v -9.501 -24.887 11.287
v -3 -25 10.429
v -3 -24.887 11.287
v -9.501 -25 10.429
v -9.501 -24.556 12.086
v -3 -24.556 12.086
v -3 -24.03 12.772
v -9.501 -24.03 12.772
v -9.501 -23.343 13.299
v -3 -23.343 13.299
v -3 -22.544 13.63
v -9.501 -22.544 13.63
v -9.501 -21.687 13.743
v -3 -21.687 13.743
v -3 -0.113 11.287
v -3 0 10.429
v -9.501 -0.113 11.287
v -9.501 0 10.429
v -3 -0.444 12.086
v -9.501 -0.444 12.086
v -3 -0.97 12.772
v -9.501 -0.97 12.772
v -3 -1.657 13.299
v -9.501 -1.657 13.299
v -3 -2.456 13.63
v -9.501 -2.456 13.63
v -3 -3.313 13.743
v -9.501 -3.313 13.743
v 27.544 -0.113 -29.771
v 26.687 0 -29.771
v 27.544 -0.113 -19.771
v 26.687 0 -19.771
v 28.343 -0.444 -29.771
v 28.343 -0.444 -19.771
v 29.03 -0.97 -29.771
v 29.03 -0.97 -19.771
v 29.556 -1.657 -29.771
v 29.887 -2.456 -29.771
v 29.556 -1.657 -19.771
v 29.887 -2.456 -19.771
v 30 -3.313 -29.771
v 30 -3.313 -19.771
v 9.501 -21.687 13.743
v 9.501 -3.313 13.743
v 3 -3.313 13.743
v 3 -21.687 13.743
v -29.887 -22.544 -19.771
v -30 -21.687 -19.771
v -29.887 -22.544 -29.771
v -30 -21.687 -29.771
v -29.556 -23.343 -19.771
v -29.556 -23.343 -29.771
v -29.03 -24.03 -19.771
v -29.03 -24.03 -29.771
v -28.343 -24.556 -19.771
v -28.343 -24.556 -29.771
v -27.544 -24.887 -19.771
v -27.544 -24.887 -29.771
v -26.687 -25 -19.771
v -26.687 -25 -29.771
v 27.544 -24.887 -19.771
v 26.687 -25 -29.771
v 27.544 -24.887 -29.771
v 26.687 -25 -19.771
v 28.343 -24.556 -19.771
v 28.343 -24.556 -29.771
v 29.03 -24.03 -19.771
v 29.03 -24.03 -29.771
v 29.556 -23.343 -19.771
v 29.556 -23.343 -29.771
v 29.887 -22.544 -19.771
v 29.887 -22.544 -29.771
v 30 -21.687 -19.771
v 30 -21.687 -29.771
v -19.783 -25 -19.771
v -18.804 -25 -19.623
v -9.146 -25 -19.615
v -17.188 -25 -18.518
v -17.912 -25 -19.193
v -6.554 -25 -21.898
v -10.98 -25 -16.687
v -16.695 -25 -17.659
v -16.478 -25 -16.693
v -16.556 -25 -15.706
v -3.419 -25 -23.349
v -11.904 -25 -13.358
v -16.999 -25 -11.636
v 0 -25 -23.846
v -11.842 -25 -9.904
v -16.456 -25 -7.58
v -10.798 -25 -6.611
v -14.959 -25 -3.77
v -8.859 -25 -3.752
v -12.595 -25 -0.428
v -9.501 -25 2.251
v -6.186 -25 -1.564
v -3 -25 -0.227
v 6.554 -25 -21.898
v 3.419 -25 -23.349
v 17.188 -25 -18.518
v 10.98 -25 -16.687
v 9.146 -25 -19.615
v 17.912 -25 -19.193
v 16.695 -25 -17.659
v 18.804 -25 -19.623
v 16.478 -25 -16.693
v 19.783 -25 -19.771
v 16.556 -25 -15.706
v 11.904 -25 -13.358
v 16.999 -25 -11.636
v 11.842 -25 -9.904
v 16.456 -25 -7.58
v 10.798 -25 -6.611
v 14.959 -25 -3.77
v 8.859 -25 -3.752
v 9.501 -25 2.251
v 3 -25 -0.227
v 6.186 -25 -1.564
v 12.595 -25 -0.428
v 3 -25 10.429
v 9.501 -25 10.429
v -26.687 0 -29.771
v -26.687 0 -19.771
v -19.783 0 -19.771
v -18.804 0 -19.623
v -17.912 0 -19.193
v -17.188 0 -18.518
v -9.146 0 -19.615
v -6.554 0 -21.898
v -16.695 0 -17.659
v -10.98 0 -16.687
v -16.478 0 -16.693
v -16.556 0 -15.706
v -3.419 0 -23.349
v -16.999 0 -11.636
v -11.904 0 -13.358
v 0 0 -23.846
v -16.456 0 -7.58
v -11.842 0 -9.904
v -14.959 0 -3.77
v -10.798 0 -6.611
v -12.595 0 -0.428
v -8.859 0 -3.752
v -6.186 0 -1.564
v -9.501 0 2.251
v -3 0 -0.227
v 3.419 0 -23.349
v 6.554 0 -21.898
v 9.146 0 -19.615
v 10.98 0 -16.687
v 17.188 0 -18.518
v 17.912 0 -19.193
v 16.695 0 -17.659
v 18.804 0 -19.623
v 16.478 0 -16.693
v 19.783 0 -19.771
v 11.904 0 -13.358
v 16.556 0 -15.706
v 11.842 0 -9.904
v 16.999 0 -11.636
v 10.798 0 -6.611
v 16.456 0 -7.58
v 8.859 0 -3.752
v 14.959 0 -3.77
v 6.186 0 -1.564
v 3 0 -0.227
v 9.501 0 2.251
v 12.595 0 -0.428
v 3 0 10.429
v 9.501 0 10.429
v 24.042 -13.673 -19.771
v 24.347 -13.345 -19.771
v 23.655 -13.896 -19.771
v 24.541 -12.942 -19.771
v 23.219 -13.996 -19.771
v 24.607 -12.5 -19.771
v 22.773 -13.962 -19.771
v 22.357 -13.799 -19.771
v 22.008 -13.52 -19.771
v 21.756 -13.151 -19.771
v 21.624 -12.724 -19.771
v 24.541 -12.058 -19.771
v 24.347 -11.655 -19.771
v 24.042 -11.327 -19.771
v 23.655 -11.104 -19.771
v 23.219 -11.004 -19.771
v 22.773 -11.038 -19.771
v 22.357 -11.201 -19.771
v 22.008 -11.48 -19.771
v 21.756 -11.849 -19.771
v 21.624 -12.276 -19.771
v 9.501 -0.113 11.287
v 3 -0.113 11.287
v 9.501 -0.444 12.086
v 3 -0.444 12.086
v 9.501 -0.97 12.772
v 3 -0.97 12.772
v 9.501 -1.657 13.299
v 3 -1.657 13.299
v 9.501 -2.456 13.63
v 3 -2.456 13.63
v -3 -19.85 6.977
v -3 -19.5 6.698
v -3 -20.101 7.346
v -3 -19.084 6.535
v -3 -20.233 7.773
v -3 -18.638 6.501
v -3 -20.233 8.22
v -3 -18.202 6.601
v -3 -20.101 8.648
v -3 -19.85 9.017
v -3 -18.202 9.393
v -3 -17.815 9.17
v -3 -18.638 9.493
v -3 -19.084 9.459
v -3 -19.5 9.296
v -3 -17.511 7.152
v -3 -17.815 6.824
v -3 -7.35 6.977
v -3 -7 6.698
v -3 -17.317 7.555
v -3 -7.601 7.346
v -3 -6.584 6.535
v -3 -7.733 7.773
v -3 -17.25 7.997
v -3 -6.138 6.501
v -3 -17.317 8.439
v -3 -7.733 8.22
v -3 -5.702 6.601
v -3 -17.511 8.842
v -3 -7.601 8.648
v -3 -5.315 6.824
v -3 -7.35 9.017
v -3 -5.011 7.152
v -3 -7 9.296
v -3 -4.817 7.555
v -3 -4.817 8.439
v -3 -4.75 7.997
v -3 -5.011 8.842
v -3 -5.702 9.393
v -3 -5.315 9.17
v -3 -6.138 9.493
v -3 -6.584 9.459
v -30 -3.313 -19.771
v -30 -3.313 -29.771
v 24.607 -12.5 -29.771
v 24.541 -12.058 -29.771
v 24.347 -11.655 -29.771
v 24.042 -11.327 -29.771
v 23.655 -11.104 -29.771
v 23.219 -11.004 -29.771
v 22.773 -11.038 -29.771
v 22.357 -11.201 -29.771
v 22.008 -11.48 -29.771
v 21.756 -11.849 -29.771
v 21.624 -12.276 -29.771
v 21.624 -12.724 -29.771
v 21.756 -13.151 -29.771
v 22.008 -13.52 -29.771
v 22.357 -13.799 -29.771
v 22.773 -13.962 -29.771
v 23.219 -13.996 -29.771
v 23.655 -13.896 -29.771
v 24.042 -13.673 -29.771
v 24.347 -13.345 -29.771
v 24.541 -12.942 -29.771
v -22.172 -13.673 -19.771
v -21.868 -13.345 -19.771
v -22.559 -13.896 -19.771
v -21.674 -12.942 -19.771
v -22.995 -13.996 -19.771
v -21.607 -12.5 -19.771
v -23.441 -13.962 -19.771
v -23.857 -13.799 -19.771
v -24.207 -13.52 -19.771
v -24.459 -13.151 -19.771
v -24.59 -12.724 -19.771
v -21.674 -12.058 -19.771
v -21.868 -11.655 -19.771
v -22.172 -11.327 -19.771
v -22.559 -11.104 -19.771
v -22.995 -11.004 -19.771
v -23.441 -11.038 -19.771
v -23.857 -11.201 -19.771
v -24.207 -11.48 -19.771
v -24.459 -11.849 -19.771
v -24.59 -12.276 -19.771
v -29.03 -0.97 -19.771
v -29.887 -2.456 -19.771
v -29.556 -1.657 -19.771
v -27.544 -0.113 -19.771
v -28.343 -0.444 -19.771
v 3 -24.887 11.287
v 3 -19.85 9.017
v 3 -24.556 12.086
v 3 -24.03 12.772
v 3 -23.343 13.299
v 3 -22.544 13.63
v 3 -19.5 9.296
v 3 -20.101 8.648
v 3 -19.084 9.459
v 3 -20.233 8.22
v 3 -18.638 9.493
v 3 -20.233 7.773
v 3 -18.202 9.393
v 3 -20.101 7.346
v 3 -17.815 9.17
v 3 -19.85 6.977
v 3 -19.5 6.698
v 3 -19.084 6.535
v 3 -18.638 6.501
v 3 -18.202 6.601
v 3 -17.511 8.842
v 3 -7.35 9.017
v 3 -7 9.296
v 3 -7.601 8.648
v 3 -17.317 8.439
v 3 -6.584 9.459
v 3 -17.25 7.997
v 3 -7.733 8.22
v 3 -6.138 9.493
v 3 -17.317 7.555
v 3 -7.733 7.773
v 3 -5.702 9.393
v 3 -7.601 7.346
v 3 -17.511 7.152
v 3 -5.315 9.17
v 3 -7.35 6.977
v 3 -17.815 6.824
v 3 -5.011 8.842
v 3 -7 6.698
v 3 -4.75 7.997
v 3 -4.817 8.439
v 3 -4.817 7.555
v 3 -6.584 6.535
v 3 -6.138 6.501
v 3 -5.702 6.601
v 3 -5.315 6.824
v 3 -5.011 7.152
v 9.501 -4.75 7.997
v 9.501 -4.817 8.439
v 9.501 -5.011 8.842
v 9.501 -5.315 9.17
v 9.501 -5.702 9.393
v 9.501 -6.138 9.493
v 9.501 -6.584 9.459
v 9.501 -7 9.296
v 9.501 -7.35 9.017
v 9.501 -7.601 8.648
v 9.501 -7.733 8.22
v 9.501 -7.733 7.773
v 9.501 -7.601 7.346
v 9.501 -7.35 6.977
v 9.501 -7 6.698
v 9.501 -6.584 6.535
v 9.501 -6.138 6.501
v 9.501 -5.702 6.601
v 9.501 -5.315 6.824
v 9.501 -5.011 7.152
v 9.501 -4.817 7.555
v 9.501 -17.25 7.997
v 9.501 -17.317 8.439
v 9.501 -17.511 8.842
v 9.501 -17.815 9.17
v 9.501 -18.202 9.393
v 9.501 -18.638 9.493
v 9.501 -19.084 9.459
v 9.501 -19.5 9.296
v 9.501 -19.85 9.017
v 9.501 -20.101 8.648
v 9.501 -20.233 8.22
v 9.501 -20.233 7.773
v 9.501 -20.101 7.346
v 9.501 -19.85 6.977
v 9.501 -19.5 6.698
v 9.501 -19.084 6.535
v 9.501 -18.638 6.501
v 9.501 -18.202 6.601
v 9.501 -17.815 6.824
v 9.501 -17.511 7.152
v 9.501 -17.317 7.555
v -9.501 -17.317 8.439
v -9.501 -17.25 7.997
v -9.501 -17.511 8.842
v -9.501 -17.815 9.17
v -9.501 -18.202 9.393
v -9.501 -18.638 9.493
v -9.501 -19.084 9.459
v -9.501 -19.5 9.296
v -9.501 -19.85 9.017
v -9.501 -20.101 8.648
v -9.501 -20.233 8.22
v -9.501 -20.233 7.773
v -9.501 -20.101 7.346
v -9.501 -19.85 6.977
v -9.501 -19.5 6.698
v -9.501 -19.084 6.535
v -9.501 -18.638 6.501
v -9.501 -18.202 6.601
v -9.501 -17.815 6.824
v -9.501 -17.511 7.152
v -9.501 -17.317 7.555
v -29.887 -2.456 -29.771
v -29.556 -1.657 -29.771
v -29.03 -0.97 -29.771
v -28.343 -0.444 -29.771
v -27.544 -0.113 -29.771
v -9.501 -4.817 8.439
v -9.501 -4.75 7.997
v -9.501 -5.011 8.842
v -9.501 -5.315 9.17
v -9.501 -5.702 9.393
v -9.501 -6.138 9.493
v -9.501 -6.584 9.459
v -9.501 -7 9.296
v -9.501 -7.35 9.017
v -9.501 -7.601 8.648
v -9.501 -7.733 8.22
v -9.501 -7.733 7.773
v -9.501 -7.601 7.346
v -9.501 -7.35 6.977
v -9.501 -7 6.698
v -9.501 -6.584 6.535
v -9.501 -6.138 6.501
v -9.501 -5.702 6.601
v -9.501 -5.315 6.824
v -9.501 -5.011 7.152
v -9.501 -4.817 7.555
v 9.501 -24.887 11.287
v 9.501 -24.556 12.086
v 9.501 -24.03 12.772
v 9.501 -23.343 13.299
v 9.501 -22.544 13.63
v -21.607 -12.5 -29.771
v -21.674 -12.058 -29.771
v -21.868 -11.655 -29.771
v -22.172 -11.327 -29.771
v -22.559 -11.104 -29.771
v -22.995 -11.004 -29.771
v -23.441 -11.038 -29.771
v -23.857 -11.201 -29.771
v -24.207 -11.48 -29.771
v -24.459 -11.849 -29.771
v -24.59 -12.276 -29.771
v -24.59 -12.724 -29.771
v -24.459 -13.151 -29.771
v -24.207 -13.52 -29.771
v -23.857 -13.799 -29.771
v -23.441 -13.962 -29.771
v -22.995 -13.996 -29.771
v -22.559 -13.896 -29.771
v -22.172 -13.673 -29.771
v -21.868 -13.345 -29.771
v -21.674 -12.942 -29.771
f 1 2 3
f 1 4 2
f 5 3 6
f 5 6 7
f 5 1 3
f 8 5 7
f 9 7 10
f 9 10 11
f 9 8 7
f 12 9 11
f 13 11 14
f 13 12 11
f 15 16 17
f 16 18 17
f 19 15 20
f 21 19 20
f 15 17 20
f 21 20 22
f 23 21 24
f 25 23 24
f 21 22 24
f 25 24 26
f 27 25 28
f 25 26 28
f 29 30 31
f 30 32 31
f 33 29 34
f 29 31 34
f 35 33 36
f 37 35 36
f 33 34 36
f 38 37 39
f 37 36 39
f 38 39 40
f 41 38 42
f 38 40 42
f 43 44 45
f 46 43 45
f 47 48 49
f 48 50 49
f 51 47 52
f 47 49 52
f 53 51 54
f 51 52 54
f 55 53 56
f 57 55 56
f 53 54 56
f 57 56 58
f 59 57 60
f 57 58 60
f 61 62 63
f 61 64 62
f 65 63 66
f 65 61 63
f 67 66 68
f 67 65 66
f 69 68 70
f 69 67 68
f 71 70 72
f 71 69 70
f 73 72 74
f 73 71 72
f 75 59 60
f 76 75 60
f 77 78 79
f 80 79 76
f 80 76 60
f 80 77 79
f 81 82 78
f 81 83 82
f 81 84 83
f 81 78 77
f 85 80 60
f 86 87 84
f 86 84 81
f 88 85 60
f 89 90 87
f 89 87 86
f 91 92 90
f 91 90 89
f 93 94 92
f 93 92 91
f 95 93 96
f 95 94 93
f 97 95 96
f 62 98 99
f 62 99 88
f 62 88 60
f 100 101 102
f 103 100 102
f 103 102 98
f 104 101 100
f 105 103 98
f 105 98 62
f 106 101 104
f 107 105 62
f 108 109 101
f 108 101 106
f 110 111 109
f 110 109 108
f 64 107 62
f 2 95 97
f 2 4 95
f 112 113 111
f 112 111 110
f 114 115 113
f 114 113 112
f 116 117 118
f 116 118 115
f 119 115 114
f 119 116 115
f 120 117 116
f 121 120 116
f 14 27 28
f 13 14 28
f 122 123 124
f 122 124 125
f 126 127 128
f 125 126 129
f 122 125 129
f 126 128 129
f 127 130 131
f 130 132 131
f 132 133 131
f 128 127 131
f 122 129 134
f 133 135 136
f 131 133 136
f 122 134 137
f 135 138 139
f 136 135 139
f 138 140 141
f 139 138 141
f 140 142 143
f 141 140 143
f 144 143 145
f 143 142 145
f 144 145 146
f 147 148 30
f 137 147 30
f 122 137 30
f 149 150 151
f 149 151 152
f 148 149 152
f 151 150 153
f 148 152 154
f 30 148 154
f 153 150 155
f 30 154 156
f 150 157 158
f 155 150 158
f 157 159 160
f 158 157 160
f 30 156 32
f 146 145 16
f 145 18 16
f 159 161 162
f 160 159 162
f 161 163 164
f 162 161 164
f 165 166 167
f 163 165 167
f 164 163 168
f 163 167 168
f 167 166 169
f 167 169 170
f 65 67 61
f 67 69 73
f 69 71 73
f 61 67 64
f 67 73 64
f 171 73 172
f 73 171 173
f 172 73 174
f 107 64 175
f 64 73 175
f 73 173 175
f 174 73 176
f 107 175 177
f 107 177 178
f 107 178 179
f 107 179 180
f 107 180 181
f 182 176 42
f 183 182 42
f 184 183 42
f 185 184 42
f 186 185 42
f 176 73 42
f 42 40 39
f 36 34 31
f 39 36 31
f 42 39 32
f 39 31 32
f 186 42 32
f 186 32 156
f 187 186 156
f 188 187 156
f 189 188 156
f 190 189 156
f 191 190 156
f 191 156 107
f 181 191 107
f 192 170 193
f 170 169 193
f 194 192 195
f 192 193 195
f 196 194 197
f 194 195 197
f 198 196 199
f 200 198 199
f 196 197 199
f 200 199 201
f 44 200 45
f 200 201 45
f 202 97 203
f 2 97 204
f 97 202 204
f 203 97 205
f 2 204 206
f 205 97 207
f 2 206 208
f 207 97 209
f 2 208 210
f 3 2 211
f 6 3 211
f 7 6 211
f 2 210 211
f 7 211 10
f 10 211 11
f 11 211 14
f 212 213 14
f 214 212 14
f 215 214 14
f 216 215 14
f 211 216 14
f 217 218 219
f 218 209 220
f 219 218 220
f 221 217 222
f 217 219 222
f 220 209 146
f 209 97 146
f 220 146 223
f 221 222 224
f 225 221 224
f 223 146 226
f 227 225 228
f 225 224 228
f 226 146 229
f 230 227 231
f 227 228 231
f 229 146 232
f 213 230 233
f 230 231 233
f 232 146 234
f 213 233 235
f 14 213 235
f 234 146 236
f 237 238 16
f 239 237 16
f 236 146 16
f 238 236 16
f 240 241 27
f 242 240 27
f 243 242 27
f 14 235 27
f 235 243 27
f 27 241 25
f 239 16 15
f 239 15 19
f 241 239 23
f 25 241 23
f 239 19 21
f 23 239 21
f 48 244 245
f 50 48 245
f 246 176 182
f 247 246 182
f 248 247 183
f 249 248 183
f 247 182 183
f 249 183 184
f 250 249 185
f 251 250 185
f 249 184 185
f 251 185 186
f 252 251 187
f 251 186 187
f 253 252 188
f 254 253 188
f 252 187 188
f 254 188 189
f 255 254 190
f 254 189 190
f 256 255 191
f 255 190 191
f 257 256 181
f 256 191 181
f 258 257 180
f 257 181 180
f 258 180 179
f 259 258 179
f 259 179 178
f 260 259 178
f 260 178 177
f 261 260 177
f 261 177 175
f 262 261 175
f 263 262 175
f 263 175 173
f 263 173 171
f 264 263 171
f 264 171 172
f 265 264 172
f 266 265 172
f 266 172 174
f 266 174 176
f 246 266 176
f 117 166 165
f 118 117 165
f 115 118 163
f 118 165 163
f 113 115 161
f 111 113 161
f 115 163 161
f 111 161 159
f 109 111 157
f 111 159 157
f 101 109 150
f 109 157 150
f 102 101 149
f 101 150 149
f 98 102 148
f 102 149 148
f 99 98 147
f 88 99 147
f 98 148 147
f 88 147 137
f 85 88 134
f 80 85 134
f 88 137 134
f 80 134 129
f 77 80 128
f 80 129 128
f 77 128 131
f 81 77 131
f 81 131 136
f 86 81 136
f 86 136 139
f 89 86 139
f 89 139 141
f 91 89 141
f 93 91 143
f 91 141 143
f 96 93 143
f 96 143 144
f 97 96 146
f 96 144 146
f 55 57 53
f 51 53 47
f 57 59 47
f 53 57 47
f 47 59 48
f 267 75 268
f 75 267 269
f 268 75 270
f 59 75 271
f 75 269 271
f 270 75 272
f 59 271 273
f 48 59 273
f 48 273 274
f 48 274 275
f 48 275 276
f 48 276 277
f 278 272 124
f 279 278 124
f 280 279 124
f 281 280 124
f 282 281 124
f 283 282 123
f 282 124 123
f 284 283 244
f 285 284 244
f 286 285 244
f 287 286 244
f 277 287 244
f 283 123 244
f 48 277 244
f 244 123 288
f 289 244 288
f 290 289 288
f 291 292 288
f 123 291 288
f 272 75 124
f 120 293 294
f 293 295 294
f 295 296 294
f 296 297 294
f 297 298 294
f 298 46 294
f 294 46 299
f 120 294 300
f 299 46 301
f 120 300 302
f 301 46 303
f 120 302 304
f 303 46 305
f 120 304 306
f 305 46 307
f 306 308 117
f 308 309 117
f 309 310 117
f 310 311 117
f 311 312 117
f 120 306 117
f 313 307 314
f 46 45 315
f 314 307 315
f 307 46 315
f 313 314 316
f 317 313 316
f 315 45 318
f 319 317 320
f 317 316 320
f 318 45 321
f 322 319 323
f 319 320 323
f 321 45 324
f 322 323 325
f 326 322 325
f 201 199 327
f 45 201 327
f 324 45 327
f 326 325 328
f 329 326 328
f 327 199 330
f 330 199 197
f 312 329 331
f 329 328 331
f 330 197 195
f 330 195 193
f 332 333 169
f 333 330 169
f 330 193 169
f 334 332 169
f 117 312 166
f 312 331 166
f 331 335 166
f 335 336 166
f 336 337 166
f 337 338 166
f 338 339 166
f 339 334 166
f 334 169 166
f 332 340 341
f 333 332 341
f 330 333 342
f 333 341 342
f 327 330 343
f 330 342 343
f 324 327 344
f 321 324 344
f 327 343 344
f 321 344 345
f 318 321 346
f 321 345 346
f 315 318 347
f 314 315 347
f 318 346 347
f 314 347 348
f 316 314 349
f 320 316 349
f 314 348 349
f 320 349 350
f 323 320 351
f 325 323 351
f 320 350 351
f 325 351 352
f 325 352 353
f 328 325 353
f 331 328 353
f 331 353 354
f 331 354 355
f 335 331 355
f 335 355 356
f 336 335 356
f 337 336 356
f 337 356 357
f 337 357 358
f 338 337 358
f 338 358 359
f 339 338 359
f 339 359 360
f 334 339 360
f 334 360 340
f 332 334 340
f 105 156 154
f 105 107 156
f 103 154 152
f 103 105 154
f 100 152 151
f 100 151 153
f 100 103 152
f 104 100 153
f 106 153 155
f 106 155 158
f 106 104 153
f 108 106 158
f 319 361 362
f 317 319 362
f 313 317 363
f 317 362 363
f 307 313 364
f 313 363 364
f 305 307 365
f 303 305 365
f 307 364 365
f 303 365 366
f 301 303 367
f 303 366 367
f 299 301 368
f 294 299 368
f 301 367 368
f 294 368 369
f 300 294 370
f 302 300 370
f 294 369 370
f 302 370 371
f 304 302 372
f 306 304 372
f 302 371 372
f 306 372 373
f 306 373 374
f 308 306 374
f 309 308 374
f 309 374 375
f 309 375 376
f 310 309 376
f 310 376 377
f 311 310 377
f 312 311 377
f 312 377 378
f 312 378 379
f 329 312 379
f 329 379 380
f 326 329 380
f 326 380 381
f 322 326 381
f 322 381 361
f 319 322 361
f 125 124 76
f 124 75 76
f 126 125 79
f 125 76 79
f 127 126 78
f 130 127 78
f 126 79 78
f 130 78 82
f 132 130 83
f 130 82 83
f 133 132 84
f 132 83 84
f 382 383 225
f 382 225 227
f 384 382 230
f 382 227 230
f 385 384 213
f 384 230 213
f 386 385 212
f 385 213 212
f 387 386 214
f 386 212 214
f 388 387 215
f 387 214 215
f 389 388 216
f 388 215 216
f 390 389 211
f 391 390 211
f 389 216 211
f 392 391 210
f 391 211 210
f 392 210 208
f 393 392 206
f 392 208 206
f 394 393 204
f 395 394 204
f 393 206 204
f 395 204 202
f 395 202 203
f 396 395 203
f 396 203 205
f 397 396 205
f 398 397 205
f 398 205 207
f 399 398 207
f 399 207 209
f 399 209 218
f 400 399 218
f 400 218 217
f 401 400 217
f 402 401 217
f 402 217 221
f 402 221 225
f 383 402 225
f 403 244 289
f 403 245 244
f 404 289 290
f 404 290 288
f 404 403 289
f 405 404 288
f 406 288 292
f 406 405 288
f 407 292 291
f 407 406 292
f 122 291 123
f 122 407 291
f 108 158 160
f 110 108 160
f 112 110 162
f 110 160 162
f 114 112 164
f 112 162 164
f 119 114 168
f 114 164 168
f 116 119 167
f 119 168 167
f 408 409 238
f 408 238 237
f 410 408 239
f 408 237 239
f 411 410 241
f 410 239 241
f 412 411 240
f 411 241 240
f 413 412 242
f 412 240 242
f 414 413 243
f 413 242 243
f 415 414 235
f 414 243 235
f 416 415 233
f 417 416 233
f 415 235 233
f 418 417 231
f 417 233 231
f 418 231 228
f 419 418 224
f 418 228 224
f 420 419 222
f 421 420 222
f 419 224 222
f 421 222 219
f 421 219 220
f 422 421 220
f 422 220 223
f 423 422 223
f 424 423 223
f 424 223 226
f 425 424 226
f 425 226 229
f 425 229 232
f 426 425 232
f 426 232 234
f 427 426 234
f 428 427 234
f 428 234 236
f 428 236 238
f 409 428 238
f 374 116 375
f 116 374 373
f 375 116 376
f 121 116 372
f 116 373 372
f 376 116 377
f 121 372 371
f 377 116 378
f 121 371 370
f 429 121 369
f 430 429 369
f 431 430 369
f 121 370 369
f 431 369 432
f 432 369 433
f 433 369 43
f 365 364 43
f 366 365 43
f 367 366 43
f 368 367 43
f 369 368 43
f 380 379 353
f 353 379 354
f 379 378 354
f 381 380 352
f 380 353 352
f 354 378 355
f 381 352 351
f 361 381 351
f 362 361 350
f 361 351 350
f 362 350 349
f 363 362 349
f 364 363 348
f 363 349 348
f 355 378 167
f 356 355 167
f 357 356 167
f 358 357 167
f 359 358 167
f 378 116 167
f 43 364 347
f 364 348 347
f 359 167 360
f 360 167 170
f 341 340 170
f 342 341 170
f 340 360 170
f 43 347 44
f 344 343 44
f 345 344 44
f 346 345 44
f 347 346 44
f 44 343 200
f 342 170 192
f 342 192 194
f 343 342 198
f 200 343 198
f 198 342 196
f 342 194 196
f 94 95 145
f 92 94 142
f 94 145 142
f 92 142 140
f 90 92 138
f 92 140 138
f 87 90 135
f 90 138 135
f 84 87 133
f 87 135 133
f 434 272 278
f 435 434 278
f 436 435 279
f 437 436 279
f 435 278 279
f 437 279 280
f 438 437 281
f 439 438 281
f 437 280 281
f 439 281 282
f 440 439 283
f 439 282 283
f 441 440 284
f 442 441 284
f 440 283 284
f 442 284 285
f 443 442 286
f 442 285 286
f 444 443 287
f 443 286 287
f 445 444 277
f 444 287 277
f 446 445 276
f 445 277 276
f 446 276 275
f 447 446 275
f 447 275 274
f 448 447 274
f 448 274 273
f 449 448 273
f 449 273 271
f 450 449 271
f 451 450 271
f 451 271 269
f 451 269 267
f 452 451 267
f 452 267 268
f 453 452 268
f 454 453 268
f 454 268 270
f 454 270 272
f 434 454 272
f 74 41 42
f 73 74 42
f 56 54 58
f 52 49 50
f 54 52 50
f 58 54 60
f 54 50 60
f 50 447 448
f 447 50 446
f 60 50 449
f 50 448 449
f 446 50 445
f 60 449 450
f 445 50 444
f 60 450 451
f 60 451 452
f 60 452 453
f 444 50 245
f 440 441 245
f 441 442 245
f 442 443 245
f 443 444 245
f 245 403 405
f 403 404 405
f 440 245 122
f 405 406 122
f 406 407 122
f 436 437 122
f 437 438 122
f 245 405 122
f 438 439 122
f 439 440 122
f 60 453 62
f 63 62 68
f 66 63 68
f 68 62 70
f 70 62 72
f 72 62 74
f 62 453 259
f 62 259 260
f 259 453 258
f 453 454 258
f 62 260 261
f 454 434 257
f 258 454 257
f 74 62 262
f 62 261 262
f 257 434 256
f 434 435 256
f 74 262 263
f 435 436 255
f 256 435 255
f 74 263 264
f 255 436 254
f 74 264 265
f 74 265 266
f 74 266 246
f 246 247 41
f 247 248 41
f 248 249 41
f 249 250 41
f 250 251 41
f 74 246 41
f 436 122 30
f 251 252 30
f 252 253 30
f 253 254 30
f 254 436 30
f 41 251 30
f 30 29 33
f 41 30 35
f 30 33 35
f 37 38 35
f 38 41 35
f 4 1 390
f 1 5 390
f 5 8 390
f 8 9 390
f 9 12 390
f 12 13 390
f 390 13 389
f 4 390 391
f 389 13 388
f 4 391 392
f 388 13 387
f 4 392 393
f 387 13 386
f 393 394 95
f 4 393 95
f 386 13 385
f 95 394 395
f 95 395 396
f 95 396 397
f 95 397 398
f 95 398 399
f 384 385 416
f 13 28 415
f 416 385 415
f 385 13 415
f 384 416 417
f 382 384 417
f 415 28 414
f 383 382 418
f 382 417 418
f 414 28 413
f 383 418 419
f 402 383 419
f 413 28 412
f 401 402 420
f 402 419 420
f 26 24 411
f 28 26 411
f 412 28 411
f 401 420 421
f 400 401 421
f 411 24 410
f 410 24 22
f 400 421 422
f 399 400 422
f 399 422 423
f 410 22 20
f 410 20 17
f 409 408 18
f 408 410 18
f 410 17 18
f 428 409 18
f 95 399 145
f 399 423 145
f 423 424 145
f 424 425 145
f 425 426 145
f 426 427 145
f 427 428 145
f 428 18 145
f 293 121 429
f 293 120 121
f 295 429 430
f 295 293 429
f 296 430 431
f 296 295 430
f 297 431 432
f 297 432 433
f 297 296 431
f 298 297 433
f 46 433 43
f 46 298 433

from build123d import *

# Parameters (mm, degrees)
F1_DEPTH = 25
F2_R     = 1.5
F3_DEPTH = 25
F4_R     = 1.5
F5_DEPTH = 25
F6_R     = 3.313414


with BuildPart() as f1:
    # F0 (on Front) → F1 (new body)
    with BuildSketch(Plane.XZ):
        with BuildLine():
            Line((-30, -29.771222), (30, -29.771222))
            Line((30, -29.771222), (30, -19.771222))
            Line((30, -19.771222), (15.039818, -19.771222))
            ThreePointArc((15.039818, -19.771222), (16.48651, -7.699644), (9.500786, 2.251013))
            Line((9.500786, 2.251013), (9.500786, 13.742813))
            Line((9.500786, 13.742813), (3, 13.742813))
            Line((3, 13.742813), (3, 4.886871))
            Line((3, 4.886871), (3, -0.22738))
            ThreePointArc((3, -0.22738), (0, -23.84633), (-3, -0.22738))
            Line((-3, -0.22738), (-3, 4.886871))
            Line((-3, 4.886871), (-3, 13.742813))
            Line((-3, 13.742813), (-9.500786, 13.742813))
            Line((-9.500786, 13.742813), (-9.500786, 2.251013))
            ThreePointArc((-9.500786, 2.251013), (-16.48651, -7.699644), (-15.039818, -19.771222))
            Line((-15.039818, -19.771222), (-30, -19.771222))
            Line((-30, -19.771222), (-30, -29.771222))
        make_face()
    extrude(amount=F1_DEPTH)

    # F2 (on face) → F3 (cut)
    with BuildSketch(Plane.XY.offset(-19.771222)):
        with Locations((-23.107162, -12.5)):
            Circle(F2_R)
        with Locations((23.107162, -12.5)):
            Circle(F2_R)
    extrude(amount=-F3_DEPTH, mode=Mode.SUBTRACT)

    # F4 (on face) → F5 (cut)
    with BuildSketch(Plane.YZ.offset(9.500786)):
        with Locations((-18.75, 7.996913)):
            Circle(F4_R)
        with Locations((-6.25, 7.996913)):
            Circle(F4_R)
    extrude(amount=-F5_DEPTH, mode=Mode.SUBTRACT)

    # F6
    f6_edges = [f1.edges().sort_by_distance(p)[0] for p in [
        (-6.250393, -25, 13.742813),
        (6.250393, -25, 13.742813),
        (-6.250393, 0, 13.742813),
        (6.250393, 0, 13.742813),
        (30, -25, -24.771222),
        (30, 0, -24.771222),
        (-30, 0, -24.771222),
        (-30, -25, -24.771222),
        (15.039818, -12.5, -19.771222),
        (-15.039818, -12.5, -19.771222),
    ]]
    fillet(f6_edges, radius=F6_R)


solid = f1.part
